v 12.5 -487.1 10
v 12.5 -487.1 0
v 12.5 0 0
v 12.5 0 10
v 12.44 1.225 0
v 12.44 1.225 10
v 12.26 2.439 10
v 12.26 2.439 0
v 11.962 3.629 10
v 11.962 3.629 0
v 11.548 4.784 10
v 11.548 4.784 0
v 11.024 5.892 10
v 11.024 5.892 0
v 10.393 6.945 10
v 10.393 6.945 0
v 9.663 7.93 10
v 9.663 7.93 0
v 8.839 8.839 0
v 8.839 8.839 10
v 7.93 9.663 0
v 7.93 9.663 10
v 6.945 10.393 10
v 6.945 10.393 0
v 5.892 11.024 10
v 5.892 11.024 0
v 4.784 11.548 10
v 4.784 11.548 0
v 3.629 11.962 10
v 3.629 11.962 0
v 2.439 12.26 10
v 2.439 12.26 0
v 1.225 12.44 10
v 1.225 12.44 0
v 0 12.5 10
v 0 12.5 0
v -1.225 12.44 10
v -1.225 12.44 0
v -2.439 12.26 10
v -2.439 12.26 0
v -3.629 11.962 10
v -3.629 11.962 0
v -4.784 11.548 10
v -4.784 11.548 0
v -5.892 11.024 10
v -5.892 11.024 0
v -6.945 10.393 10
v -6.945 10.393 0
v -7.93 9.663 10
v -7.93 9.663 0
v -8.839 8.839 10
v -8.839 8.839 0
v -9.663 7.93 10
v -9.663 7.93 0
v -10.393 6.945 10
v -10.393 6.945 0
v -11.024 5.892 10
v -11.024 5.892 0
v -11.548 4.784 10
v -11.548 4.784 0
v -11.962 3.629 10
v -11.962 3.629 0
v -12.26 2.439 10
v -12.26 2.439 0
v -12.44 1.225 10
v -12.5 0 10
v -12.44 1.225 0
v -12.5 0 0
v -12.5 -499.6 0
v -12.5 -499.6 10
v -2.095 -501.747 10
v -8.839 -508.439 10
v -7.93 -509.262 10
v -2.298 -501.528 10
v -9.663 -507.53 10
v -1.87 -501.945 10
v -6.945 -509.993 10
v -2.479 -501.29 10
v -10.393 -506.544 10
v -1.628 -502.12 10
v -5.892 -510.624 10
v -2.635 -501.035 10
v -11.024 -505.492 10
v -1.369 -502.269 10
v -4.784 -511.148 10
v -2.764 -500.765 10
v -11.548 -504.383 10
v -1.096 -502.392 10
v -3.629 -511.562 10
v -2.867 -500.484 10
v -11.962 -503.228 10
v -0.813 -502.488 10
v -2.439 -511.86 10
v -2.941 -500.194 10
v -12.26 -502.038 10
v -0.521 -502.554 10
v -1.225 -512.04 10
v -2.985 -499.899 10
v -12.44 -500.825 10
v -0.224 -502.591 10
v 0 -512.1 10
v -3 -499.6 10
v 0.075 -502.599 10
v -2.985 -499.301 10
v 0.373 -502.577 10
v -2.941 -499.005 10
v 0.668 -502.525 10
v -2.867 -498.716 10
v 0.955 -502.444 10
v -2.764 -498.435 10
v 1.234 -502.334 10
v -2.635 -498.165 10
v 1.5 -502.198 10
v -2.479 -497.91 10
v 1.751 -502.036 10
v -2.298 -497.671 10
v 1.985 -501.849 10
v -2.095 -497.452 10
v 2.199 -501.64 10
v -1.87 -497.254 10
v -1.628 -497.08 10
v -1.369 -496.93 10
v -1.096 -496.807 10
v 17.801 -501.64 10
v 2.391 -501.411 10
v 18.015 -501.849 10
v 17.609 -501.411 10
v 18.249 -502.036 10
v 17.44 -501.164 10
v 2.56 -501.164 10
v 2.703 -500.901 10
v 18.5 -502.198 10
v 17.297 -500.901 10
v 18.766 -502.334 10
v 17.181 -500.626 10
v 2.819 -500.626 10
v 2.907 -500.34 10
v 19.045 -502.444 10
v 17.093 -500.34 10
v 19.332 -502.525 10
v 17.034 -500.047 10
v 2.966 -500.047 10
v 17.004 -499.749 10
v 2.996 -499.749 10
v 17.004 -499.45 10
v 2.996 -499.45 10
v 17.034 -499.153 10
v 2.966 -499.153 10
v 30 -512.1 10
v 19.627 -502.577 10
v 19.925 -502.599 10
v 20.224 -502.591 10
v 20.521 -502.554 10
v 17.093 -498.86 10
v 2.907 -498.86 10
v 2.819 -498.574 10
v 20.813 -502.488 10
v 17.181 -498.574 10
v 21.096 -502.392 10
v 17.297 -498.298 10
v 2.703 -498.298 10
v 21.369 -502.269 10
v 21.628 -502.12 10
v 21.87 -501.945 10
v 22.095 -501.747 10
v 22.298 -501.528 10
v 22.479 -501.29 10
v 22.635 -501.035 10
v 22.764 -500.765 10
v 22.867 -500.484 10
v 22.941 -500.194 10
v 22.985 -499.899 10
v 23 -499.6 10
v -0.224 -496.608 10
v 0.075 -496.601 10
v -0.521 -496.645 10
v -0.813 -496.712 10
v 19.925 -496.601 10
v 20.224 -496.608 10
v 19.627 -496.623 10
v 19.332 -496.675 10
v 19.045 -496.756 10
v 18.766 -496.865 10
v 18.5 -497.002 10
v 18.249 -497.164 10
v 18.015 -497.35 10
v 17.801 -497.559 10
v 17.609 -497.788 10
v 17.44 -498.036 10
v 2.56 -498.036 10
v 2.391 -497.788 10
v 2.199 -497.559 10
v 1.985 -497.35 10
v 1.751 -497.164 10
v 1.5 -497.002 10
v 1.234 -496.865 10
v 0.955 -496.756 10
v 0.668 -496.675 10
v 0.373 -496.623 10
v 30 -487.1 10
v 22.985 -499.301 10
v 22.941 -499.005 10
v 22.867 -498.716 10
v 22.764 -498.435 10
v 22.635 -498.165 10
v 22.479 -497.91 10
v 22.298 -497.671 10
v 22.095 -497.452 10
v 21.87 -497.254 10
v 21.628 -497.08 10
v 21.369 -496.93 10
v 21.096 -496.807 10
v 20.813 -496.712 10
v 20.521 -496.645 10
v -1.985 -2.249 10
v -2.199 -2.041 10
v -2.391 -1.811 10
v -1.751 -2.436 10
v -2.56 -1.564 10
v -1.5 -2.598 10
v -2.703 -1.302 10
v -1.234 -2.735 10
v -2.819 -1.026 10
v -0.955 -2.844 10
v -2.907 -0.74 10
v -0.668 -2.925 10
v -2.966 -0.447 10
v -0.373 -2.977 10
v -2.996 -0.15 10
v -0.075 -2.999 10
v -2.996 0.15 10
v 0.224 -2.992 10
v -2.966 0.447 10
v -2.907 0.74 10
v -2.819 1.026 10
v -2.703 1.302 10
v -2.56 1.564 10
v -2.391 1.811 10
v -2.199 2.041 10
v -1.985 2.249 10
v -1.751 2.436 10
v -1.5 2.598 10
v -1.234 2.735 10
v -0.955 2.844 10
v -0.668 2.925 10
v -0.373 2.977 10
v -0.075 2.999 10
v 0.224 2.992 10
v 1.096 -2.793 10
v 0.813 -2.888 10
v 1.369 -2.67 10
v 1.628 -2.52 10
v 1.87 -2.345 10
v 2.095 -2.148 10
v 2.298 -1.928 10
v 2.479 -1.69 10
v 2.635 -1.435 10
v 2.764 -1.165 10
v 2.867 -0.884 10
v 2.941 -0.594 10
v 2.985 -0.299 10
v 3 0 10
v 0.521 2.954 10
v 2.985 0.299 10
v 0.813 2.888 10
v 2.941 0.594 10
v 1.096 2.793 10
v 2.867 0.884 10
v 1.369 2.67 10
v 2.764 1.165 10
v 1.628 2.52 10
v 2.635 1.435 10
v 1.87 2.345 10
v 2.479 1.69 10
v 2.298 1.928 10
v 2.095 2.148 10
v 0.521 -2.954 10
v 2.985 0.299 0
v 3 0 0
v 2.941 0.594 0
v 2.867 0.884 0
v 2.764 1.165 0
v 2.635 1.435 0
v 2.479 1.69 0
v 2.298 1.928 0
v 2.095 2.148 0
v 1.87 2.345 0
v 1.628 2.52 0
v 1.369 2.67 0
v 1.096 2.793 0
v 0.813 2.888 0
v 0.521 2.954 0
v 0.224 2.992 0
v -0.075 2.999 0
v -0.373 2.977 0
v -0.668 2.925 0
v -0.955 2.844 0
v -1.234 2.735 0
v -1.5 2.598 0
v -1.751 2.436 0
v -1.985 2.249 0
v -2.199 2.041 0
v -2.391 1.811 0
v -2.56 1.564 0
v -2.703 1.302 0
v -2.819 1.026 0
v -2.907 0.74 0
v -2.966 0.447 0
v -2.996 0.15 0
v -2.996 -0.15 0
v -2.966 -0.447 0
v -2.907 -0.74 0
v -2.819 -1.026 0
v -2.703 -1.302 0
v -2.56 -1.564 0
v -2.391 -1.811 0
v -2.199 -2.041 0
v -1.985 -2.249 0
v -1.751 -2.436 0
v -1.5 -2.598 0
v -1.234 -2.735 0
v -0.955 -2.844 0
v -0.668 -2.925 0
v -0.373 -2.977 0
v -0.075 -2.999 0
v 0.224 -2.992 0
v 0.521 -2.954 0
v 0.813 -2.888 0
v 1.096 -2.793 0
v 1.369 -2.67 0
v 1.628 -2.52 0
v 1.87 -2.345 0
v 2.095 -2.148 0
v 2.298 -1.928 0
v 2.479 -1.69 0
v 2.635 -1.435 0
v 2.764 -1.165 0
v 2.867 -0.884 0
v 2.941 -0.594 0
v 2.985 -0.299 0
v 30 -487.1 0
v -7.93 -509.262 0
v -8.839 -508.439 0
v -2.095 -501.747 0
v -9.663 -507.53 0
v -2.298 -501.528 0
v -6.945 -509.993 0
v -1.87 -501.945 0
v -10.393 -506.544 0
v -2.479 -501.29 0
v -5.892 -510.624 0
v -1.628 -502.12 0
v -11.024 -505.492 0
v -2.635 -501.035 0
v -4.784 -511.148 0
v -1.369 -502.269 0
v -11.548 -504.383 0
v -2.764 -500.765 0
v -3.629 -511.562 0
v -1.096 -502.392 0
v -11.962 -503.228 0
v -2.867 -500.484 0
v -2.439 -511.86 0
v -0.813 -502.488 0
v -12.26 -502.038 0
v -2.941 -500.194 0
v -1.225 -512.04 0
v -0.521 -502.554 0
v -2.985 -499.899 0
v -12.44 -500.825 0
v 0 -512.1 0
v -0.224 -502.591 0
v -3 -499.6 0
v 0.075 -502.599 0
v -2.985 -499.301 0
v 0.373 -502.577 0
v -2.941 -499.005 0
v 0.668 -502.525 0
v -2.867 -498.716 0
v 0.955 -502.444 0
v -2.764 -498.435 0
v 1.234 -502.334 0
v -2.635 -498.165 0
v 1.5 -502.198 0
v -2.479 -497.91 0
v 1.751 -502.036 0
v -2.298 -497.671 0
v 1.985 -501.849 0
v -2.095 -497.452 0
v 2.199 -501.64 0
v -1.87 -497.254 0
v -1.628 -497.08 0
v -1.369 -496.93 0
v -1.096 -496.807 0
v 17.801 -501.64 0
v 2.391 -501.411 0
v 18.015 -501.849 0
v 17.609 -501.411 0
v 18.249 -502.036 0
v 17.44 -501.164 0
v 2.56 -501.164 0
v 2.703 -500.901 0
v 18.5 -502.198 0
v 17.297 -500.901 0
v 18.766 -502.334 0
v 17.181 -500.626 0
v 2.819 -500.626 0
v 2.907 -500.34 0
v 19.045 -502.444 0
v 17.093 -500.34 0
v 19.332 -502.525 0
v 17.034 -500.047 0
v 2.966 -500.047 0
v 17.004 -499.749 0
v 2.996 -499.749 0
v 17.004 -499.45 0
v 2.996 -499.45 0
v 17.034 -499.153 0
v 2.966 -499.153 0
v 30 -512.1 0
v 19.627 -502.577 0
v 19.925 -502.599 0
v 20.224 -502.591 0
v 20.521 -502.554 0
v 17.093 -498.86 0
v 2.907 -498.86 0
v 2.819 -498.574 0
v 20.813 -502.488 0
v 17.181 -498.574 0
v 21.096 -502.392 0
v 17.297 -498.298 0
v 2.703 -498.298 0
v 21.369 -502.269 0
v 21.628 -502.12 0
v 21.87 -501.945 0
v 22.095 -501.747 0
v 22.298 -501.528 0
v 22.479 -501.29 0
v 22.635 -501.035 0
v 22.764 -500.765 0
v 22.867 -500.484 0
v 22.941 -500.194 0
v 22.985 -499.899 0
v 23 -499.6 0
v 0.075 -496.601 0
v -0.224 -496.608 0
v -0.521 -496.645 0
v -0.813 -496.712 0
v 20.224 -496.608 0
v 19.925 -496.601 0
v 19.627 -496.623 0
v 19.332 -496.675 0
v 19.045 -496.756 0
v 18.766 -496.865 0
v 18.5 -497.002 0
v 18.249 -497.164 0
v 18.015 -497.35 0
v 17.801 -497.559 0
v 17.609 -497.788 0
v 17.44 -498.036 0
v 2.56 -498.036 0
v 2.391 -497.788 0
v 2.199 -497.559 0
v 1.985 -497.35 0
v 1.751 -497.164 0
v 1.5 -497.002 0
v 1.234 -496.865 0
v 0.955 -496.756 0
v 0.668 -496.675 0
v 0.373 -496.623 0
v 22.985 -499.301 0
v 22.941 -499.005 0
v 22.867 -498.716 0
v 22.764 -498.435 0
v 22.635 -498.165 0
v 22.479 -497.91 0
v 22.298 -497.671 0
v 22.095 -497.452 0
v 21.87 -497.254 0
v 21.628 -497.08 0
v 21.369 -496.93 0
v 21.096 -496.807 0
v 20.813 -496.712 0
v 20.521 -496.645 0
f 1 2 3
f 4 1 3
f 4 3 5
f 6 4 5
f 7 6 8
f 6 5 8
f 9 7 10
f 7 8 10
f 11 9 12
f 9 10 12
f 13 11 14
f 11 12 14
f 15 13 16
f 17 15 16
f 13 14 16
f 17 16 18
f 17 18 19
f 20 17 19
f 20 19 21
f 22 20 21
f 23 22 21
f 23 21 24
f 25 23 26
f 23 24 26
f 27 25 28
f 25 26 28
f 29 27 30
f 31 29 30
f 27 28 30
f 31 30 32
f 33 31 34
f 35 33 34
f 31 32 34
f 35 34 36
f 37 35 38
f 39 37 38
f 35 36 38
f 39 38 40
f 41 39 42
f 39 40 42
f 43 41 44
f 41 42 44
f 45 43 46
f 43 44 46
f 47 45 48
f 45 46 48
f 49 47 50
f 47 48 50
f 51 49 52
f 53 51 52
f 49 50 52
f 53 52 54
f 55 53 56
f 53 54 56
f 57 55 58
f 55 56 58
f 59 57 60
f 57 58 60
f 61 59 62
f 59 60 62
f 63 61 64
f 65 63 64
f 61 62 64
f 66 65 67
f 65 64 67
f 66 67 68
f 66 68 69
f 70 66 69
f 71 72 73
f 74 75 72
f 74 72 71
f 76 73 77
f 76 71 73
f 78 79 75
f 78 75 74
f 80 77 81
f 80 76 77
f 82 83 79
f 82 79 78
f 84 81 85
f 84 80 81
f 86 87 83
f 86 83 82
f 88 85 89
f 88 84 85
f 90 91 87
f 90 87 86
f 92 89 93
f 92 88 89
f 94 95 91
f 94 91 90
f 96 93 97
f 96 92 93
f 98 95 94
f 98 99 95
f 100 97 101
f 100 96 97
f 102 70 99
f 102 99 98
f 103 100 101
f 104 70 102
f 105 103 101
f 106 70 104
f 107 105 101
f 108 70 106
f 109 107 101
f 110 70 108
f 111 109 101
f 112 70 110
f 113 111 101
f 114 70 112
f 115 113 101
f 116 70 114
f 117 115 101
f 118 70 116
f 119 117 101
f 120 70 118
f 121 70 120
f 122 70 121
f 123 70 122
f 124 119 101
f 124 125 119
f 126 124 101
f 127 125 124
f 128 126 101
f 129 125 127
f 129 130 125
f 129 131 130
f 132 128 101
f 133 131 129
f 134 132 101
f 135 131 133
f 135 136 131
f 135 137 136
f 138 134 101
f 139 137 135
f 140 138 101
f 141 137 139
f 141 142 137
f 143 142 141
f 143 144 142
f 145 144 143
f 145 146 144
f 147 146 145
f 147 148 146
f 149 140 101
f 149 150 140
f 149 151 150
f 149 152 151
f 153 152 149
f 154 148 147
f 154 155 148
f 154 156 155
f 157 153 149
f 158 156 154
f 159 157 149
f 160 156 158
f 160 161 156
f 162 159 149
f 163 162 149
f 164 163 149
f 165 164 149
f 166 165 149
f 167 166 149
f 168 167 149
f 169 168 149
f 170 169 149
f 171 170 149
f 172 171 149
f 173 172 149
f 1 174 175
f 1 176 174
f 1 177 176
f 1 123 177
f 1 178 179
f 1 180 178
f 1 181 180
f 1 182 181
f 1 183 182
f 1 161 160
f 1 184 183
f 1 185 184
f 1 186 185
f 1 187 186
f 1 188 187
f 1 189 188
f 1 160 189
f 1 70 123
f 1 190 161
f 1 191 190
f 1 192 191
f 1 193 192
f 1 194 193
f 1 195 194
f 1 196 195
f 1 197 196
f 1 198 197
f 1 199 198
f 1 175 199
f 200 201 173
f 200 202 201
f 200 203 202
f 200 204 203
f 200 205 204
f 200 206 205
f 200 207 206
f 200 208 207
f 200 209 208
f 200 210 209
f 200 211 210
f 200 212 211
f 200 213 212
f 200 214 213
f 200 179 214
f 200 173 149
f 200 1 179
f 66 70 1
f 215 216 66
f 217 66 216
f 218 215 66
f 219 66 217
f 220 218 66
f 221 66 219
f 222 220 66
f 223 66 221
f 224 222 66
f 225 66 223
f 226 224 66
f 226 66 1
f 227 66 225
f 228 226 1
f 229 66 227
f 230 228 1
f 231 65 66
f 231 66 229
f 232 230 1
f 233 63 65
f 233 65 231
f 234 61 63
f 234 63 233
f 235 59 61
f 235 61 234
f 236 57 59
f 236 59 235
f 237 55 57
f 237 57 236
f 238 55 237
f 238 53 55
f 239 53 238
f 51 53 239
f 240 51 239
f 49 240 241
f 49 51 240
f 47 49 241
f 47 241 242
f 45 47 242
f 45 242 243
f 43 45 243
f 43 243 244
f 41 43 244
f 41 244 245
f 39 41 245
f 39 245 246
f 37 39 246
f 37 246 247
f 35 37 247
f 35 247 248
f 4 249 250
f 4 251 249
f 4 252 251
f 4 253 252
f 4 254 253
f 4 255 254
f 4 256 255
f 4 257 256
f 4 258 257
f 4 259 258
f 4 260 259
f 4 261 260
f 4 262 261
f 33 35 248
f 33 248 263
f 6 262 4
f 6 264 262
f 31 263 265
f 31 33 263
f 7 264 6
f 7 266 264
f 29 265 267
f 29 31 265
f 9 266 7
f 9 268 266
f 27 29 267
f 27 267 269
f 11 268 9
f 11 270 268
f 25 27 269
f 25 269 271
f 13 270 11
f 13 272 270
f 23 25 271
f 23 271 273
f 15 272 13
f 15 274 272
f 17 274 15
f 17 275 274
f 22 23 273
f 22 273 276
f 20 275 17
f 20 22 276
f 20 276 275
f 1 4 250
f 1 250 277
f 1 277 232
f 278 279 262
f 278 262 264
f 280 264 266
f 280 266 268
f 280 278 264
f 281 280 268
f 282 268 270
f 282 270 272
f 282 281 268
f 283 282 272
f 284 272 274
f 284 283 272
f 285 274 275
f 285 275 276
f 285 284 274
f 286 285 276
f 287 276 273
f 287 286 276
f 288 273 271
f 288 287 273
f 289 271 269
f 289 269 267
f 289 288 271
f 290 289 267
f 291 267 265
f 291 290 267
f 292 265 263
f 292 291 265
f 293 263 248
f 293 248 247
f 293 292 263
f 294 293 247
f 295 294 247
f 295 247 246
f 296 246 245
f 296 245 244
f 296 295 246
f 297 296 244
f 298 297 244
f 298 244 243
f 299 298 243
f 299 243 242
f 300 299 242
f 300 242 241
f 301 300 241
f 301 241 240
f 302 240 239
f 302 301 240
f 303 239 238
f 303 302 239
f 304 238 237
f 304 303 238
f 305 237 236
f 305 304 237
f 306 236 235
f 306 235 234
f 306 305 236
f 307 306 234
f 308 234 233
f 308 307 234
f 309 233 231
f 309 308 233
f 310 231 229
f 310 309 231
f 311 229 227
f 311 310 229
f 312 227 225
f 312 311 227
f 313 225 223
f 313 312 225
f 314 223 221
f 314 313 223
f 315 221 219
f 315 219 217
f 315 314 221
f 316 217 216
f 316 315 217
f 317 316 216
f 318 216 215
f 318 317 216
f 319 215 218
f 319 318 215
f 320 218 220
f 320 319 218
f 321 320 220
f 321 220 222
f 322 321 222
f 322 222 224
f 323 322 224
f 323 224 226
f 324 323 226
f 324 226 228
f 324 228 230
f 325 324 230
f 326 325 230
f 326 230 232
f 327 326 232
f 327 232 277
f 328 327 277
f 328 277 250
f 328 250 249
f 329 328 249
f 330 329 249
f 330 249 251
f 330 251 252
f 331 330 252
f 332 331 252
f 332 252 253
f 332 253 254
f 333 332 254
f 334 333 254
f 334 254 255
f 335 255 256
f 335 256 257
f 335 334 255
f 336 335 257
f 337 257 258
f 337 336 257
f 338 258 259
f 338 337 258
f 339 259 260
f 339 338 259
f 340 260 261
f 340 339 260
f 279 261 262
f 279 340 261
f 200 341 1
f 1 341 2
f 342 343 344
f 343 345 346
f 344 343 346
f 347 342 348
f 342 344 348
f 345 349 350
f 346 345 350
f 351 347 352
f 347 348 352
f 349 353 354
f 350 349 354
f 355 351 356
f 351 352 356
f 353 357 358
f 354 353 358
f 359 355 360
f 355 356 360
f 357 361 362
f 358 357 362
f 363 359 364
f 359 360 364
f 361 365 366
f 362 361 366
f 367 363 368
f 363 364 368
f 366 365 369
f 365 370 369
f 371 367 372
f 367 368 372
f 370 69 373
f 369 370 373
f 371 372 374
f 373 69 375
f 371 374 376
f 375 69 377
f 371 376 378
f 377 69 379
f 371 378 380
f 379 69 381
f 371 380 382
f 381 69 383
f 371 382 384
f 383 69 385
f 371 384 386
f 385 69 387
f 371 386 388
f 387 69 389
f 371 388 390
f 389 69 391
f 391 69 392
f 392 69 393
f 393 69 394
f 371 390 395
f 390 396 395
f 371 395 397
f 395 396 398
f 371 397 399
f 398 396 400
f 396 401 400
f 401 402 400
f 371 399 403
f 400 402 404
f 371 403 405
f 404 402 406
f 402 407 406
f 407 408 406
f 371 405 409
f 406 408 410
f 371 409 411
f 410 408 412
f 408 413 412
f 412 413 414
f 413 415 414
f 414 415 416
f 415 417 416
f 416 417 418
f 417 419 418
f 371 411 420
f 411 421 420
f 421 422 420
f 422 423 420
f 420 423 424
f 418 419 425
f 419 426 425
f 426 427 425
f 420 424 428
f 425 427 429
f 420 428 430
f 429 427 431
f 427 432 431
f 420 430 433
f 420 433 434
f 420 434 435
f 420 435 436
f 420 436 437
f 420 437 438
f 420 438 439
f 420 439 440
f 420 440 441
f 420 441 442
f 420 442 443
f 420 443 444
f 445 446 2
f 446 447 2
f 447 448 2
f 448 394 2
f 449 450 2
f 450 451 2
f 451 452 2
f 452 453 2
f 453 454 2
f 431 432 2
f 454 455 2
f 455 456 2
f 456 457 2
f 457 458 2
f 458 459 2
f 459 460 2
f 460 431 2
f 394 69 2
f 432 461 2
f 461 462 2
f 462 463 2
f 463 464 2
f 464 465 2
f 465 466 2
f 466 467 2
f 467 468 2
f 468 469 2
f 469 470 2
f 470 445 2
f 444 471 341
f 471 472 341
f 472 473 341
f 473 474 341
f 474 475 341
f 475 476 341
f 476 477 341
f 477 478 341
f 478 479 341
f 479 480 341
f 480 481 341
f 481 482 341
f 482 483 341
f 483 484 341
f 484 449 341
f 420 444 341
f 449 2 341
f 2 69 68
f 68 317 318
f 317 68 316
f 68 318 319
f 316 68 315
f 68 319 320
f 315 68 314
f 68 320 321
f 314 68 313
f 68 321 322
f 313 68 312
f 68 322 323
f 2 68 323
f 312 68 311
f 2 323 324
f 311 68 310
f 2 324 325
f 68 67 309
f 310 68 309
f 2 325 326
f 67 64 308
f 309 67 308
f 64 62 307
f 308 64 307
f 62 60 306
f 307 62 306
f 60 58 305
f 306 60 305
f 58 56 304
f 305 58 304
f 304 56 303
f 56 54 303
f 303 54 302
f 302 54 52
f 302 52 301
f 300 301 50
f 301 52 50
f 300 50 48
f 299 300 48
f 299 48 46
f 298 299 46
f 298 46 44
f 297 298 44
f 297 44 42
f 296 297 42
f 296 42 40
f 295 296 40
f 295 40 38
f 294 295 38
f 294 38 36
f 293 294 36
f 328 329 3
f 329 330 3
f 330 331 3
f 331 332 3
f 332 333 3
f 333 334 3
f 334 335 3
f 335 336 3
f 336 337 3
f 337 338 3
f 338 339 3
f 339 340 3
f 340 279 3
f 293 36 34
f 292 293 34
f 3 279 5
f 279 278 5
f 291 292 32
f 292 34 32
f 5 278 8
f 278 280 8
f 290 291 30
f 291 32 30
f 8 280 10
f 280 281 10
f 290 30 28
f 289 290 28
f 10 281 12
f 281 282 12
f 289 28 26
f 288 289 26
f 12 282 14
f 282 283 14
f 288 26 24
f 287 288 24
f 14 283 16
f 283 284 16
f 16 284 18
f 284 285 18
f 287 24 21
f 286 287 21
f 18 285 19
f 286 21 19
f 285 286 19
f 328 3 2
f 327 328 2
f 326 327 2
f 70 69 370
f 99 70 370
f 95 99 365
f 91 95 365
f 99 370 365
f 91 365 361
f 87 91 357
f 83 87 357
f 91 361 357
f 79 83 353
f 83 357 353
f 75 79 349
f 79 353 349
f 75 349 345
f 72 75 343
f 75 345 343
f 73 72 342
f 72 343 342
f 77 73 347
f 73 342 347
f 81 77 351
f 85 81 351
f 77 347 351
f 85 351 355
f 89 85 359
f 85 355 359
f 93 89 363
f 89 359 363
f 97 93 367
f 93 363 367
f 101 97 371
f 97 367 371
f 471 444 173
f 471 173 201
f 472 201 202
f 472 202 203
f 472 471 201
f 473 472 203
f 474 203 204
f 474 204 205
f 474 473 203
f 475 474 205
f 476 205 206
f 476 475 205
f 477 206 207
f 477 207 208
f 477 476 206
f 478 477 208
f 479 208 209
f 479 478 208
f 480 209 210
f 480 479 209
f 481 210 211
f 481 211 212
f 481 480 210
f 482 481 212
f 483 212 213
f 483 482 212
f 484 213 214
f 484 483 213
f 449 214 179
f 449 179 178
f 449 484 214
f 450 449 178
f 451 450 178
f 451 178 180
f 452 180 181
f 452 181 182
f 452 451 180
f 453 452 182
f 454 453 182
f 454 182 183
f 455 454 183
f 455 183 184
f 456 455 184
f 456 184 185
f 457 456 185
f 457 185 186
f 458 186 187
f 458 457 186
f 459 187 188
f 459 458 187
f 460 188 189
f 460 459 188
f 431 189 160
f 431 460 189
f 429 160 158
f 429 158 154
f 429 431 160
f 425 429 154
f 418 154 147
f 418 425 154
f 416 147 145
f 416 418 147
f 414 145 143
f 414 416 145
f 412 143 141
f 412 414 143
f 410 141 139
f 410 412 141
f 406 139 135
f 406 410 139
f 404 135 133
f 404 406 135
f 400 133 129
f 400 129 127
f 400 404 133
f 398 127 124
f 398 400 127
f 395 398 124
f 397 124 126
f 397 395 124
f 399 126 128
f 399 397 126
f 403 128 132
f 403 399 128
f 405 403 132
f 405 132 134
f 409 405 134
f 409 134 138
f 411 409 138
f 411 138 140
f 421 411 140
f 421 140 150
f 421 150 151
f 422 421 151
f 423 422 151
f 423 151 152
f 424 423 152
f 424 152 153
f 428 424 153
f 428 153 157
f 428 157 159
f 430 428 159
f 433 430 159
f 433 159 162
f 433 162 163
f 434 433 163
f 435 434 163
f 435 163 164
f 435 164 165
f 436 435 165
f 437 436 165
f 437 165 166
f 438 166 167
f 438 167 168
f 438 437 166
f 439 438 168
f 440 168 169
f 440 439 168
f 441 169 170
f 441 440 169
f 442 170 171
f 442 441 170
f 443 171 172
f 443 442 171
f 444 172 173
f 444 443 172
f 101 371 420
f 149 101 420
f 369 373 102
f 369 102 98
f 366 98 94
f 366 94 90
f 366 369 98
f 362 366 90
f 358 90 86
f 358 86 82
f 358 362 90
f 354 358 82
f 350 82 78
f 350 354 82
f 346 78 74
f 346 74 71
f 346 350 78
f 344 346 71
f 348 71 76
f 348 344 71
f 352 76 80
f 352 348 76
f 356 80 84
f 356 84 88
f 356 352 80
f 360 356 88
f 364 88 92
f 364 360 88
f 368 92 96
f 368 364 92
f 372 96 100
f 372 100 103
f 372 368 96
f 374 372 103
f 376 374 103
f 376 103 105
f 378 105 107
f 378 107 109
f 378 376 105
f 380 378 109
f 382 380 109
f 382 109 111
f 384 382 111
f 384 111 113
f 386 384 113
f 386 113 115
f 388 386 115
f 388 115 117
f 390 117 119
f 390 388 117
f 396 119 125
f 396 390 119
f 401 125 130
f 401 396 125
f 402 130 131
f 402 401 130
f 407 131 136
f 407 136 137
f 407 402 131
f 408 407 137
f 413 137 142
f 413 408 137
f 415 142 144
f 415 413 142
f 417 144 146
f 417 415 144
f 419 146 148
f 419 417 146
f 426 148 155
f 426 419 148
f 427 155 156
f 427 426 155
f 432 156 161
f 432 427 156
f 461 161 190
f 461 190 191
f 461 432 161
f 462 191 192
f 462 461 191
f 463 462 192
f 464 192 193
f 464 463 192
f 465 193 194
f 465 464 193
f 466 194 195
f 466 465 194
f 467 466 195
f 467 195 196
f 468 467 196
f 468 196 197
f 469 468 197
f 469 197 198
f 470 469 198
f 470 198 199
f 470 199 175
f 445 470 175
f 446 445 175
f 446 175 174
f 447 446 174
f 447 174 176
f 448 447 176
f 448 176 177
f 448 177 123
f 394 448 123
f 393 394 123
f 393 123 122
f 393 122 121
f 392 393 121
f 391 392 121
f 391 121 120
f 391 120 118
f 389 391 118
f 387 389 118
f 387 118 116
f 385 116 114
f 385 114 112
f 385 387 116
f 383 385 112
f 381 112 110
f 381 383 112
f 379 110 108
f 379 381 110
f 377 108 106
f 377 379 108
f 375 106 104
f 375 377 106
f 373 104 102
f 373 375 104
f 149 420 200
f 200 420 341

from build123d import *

# Parameters (mm, degrees)
SKETCH1_R           = 3
BOSS_EXTRUDE1_DEPTH = 10


with BuildPart() as part:
    # Sketch1 → Boss-Extrude1 (new body)
    with BuildSketch(Plane.XY):
        with BuildLine():
            Line((-12.5, 0), (-12.5, -499.599839872))
            ThreePointArc((-12.5, -499.599839872), (-8.838834765, -508.438674637), (0, -512.099839872))
            Line((0, -512.099839872), (30, -512.099839872))
            Line((30, -512.099839872), (30, -487.099839872))
            Line((30, -487.099839872), (12.5, -487.099839872))
            Line((12.5, -487.099839872), (12.5, 0))
            ThreePointArc((12.5, 0), (0, 12.5), (-12.5, 0))
        make_face()
        Circle(SKETCH1_R, mode=Mode.SUBTRACT)
        with Locations(Location((0, -499.599839872, 0), (0, 0, 180))):
            Circle(SKETCH1_R, mode=Mode.SUBTRACT)
        with Locations((20, -499.599839872)):
            Circle(SKETCH1_R, mode=Mode.SUBTRACT)
    extrude(amount=BOSS_EXTRUDE1_DEPTH)


solid = part.part
